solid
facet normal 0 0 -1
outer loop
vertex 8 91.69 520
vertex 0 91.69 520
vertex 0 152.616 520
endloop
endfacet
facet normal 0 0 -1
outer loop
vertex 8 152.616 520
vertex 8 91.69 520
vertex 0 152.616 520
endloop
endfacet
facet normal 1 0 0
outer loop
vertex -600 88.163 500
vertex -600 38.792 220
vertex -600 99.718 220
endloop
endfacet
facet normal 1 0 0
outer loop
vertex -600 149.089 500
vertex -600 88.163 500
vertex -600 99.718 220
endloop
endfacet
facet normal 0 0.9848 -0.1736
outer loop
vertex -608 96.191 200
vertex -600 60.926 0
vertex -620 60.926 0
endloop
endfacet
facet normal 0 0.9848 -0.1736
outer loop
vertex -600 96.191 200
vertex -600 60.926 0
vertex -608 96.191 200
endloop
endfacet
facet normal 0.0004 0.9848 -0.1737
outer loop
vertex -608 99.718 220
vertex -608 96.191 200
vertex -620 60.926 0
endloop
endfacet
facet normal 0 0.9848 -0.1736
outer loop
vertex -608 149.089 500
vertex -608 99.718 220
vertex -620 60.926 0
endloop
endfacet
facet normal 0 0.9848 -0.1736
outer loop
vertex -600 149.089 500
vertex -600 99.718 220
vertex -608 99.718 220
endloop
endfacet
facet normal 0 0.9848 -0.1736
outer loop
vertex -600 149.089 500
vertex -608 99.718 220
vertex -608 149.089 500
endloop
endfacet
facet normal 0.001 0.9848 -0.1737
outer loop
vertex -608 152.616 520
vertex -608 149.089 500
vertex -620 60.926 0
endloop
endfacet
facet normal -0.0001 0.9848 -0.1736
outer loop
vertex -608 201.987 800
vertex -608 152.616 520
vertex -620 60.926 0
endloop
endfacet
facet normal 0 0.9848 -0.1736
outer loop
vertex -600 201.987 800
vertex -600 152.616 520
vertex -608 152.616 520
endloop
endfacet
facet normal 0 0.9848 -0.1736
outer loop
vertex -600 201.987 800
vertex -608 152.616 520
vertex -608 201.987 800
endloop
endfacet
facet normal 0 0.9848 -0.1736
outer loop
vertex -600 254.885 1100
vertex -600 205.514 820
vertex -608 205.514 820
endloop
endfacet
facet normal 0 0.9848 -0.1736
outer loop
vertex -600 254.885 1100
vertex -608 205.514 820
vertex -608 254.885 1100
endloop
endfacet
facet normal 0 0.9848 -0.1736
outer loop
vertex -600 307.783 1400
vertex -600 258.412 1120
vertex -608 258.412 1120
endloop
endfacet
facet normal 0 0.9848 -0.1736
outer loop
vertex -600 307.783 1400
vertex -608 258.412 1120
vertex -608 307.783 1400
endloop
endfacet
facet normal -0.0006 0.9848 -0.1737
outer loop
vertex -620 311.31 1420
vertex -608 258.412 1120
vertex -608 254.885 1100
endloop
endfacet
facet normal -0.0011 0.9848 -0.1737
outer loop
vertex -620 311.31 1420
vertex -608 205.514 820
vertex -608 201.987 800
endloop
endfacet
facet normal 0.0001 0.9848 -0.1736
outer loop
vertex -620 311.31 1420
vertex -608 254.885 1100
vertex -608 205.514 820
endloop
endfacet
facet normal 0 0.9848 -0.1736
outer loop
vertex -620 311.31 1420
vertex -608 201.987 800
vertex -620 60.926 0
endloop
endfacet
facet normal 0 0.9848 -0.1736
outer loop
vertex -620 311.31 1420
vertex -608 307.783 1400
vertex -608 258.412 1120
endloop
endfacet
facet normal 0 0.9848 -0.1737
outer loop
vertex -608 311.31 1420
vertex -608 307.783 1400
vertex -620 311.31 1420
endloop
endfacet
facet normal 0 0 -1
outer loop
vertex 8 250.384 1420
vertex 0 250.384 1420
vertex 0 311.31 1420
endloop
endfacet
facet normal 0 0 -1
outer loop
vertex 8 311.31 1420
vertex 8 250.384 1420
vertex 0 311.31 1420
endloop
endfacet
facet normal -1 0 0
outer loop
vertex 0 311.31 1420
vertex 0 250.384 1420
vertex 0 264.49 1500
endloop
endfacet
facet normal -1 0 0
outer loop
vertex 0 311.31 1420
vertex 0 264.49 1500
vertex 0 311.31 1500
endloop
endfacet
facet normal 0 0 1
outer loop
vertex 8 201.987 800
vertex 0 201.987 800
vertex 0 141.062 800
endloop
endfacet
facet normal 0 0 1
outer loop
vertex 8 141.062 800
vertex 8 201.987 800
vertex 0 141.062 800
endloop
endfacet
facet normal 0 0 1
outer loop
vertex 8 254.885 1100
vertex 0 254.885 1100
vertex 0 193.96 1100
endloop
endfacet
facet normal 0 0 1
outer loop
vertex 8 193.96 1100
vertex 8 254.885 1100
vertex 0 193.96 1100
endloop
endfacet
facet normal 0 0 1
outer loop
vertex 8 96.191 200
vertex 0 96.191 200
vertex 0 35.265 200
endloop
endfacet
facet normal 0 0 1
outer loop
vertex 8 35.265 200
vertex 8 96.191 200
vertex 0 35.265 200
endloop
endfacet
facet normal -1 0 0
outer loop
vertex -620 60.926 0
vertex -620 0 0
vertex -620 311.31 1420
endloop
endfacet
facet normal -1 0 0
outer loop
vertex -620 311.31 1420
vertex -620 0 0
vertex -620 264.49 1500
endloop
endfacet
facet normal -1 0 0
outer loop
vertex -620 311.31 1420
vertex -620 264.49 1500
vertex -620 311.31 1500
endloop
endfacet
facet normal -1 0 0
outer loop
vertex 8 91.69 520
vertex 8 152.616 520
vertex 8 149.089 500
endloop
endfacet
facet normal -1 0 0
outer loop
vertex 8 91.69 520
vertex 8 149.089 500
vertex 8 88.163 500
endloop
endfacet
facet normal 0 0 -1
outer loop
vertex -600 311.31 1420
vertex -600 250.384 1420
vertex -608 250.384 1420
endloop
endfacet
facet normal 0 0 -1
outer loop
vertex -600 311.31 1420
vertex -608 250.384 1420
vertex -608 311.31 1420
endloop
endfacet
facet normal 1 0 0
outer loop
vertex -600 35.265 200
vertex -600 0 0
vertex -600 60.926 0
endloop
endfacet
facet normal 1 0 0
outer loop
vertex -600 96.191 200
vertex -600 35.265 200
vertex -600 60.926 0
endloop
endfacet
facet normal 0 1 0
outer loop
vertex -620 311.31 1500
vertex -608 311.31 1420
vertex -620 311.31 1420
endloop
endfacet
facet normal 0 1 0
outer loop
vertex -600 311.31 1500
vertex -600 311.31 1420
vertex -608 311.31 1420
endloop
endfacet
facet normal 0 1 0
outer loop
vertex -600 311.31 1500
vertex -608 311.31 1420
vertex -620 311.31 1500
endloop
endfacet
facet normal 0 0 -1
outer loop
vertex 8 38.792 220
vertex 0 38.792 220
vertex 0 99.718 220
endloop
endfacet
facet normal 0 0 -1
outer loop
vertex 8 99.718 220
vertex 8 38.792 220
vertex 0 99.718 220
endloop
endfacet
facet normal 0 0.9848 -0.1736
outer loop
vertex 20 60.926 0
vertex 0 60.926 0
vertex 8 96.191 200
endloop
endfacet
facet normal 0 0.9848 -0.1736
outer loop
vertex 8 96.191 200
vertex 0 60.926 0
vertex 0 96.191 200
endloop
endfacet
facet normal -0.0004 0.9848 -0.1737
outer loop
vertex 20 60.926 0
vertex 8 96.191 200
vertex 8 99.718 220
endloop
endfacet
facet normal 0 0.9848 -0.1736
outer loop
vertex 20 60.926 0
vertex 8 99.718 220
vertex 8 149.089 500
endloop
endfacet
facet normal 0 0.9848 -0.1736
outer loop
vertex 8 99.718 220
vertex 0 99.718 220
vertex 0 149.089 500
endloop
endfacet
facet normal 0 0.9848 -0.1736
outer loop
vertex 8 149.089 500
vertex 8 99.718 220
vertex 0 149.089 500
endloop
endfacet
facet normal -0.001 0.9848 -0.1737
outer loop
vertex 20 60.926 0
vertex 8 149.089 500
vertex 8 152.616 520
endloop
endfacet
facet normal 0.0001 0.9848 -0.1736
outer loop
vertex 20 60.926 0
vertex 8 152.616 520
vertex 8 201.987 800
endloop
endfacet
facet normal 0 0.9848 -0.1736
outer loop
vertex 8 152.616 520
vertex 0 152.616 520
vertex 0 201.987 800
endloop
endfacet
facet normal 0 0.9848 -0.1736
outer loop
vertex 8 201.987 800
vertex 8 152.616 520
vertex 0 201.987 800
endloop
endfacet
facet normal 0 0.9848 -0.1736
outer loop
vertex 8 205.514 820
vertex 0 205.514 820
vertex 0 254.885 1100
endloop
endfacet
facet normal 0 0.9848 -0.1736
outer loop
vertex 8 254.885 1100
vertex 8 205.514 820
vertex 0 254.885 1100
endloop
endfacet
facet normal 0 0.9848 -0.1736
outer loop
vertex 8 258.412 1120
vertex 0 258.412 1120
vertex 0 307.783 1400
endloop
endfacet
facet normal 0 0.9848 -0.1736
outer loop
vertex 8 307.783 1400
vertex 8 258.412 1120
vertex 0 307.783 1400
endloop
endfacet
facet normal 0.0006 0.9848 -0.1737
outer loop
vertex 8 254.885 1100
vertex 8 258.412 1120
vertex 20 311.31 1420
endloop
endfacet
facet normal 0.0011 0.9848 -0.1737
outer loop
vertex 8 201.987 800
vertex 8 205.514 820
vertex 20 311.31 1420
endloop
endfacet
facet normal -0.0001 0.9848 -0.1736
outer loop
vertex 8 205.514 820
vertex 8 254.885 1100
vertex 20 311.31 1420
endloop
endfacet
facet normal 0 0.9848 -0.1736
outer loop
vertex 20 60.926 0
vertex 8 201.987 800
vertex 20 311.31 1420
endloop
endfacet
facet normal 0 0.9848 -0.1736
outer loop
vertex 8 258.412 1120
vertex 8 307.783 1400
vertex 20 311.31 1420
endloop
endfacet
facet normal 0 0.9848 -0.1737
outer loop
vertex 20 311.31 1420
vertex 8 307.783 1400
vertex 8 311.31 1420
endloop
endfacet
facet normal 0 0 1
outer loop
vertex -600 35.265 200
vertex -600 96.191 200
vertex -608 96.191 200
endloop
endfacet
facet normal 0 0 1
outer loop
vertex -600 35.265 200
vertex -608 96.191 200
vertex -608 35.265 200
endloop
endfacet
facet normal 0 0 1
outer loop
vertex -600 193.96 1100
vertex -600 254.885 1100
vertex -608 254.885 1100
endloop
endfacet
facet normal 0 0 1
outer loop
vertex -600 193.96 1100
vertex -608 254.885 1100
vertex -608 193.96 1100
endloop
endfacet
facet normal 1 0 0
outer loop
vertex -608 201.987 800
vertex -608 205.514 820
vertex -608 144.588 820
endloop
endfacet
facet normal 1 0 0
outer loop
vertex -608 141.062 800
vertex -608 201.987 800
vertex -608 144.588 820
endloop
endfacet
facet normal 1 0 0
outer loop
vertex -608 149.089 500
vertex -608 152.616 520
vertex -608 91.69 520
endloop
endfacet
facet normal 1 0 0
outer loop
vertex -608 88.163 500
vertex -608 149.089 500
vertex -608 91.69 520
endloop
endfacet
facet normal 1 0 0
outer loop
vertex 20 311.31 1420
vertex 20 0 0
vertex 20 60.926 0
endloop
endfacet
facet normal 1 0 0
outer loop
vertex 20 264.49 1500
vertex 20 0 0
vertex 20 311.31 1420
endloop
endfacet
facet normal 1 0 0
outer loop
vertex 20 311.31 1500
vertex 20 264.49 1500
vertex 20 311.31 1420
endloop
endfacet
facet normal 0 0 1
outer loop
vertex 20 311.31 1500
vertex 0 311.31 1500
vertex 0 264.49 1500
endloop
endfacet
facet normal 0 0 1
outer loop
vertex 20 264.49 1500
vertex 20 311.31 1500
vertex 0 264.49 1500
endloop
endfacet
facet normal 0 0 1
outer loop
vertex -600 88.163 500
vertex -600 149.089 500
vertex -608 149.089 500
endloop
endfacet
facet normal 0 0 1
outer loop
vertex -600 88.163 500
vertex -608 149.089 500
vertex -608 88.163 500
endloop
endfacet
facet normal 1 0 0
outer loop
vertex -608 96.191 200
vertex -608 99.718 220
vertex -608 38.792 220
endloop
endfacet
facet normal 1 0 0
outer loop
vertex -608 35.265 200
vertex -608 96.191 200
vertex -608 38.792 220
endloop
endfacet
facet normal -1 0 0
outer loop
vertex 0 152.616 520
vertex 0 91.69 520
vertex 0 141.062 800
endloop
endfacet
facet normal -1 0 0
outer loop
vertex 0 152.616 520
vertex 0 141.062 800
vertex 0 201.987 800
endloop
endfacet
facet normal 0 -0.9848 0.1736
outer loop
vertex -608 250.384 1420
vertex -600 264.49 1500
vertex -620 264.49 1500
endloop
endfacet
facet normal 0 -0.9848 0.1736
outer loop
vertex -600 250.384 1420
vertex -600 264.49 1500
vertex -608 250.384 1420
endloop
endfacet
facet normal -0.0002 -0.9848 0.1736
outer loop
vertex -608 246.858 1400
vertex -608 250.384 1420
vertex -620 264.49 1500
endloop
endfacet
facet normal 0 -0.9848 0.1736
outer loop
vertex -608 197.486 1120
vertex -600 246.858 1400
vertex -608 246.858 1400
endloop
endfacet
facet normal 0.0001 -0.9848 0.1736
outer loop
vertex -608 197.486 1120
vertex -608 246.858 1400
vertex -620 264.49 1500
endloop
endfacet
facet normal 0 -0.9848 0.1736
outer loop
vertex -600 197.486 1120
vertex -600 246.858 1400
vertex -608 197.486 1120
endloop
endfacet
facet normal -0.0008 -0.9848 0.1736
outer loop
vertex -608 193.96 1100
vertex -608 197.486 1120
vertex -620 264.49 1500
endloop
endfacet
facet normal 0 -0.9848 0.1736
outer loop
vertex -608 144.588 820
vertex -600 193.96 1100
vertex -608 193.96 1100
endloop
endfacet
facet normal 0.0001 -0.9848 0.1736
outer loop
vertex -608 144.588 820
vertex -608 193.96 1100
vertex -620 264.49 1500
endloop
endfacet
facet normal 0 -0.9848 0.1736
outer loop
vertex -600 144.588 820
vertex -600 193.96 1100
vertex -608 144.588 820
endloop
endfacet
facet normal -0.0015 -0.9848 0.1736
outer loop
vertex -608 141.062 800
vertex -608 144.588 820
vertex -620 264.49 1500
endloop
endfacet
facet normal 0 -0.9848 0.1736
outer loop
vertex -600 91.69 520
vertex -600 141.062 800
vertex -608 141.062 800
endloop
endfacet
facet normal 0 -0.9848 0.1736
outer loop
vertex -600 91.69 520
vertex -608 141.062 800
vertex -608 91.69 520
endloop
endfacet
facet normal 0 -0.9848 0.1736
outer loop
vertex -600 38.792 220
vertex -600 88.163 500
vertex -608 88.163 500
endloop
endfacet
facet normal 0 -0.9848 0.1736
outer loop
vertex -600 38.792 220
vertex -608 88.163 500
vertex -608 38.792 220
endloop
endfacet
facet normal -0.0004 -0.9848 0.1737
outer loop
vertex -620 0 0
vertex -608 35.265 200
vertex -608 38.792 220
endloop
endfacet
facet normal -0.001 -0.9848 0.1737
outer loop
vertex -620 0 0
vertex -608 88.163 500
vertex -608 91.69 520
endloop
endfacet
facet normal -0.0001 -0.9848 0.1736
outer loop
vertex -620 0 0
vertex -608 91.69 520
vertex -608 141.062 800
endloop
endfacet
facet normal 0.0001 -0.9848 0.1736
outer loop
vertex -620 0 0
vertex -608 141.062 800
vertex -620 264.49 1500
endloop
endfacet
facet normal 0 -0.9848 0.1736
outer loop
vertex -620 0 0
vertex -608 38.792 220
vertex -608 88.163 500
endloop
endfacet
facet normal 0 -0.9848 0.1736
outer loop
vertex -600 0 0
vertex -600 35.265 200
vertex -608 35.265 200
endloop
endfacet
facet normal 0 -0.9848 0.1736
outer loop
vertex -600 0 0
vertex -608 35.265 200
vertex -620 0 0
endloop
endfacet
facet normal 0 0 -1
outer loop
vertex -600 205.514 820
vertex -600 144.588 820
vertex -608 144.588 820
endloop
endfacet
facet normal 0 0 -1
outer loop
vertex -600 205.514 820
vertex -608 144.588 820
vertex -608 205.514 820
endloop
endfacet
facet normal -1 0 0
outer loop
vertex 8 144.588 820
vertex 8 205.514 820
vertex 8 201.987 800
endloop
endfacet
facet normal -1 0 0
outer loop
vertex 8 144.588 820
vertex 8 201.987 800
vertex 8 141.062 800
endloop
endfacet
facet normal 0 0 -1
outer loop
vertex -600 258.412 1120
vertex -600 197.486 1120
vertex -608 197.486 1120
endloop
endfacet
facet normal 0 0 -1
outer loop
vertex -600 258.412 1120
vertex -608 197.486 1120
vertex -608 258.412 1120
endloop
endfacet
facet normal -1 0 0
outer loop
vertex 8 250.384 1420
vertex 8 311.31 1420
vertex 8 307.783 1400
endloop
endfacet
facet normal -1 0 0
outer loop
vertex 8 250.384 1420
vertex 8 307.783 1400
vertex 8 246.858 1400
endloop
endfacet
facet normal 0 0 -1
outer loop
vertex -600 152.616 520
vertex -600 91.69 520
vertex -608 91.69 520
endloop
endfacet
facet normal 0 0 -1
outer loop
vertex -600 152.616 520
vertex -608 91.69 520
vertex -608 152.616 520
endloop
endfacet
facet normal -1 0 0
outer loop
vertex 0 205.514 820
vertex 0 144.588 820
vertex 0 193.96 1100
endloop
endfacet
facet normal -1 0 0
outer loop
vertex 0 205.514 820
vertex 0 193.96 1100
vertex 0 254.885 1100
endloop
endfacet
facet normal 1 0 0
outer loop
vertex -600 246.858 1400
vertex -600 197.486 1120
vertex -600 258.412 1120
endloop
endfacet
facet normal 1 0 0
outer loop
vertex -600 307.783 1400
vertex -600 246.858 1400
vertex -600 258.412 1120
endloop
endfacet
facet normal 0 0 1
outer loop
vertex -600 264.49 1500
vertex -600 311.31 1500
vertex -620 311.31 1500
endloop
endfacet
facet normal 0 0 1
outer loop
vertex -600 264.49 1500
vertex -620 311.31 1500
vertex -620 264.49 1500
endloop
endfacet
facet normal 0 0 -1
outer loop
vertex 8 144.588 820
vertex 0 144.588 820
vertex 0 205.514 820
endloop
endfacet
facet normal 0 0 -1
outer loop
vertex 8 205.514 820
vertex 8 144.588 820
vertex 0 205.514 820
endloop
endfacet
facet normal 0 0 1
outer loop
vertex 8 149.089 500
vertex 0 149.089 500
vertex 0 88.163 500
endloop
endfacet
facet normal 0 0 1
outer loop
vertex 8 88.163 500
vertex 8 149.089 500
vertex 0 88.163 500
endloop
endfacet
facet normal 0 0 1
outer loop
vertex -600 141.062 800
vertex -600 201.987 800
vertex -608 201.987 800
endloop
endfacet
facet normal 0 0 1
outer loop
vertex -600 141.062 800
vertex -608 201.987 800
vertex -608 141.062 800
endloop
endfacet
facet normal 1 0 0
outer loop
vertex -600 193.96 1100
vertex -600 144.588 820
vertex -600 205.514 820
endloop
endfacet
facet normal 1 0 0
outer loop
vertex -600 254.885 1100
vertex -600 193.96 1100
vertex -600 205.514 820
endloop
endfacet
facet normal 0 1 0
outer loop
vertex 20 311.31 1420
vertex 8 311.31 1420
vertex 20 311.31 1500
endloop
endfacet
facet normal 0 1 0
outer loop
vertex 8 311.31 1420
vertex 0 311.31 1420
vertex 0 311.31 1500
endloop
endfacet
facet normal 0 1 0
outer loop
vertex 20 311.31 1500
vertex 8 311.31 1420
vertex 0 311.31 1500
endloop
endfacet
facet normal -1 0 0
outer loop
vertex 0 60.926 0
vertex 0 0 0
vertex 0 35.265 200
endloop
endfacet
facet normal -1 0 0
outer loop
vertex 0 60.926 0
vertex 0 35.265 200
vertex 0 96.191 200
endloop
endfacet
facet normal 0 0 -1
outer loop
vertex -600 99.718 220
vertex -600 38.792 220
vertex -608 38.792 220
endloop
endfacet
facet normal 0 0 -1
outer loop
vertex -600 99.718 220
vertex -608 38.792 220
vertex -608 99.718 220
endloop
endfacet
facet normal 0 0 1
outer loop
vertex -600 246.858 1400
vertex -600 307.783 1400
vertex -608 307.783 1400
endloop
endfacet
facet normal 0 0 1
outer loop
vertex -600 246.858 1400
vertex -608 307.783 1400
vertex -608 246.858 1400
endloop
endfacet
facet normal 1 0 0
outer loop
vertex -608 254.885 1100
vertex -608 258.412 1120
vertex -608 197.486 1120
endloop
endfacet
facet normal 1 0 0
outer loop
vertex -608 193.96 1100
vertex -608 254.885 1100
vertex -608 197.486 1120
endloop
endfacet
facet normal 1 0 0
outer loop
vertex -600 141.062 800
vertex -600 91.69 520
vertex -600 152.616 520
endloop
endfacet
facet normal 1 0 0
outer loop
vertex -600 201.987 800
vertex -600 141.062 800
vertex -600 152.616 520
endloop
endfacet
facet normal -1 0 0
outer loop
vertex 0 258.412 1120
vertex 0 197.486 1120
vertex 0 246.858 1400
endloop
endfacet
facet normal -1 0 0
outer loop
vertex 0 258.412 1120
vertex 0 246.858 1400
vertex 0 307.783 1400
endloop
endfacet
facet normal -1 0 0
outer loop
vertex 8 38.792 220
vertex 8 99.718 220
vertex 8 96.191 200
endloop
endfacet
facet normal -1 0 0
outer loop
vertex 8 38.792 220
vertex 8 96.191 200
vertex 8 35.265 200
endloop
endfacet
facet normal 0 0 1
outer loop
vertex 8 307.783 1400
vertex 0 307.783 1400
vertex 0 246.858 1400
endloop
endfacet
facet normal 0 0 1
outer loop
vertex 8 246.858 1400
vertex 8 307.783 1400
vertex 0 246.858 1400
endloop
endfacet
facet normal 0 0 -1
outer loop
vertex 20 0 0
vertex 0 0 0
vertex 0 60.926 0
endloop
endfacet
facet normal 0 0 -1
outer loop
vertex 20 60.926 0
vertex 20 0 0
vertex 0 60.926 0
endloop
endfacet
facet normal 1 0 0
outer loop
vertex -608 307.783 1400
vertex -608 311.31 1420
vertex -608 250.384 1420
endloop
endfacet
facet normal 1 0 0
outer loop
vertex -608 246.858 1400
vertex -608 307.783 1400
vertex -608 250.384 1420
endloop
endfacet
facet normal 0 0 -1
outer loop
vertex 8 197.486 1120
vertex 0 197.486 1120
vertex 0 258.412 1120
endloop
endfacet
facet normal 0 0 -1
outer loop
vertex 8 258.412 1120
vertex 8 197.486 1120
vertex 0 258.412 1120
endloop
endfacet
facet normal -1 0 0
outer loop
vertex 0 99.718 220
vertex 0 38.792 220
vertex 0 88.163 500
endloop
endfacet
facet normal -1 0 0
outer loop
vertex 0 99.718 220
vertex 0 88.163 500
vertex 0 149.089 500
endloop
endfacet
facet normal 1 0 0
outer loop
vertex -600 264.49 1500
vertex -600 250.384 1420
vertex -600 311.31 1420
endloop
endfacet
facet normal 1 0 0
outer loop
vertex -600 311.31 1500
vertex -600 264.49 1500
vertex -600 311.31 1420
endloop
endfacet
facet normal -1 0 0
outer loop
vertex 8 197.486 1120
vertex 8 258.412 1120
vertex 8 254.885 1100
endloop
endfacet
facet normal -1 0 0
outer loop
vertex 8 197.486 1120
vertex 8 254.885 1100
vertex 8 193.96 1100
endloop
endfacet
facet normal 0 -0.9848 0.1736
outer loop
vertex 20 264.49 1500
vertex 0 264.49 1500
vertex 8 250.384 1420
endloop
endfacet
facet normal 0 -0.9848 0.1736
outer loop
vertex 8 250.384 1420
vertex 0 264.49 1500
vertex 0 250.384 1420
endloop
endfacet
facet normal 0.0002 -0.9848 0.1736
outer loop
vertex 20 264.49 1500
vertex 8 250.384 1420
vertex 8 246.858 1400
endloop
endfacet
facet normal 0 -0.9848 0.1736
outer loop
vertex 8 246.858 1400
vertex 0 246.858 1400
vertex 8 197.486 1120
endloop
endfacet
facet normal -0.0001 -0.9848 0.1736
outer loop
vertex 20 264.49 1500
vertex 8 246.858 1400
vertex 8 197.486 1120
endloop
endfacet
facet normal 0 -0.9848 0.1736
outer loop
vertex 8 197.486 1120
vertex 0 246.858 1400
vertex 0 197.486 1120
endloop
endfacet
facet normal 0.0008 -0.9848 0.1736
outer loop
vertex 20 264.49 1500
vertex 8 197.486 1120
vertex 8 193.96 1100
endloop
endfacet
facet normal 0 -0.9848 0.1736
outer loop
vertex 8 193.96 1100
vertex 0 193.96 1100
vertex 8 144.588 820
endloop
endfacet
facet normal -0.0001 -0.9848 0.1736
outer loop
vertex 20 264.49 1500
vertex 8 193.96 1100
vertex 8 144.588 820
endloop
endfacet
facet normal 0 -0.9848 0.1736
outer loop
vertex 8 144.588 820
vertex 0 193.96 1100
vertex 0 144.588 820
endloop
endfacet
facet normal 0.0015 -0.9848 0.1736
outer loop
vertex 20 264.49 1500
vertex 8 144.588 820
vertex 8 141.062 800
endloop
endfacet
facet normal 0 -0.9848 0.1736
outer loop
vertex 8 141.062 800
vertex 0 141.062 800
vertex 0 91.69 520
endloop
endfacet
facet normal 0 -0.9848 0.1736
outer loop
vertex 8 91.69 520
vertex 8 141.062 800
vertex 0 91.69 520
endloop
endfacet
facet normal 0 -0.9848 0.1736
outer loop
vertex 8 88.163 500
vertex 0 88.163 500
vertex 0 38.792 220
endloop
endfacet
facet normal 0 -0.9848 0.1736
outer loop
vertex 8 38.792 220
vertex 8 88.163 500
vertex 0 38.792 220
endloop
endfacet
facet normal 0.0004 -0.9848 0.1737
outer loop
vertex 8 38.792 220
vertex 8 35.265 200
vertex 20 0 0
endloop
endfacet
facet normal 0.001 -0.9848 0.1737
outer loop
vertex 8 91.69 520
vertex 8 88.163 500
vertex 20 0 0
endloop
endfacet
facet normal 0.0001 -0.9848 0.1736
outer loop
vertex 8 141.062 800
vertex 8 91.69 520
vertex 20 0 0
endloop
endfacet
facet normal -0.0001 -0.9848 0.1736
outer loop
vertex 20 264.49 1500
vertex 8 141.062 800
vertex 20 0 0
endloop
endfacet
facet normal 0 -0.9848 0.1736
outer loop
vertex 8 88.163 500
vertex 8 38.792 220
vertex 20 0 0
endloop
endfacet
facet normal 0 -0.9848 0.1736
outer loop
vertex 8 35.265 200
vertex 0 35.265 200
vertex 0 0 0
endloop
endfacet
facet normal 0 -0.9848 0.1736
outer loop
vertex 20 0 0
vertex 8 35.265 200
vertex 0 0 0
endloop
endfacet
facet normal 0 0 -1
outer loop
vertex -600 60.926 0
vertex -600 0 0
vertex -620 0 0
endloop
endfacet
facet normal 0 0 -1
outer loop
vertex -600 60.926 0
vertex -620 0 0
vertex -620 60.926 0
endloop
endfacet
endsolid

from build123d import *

# Parameters (mm, degrees)
F1_DEPTH = 20
F3_DEPTH = 8
F5_DEPTH = 20.001


with BuildPart() as f1:
    # F0 (on Right) → F1 (new body)
    with BuildSketch(Plane.YZ):
        Polygon((264.4904710627, 1500), (0, 0), (60.9255967131, 0), (325.4160677758, 1500), align=None)
    extrude(amount=F1_DEPTH)

    # F2 (on face) → F3 (cut)
    with BuildSketch(Plane(origin=(0, 0, 0), x_dir=(0, -1, 0), z_dir=(-1, 0, 0))):
        Polygon((-246.8577729919, 1400), (-250.384312606, 1420), (-311.3099093192, 1420), (-307.783369705, 1400), align=None)
        Polygon((-99.717532469, 220), (-96.1909928548, 200), (-35.2653961417, 200), (-38.7919357559, 220), align=None)
        Polygon((-152.6156266815, 520), (-149.0890870674, 500), (-88.1634903542, 500), (-91.6900299684, 520), align=None)
        Polygon((-205.5137208941, 820), (-201.9871812799, 800), (-141.0615845668, 800), (-144.5881241809, 820), align=None)
        Polygon((-258.4118151066, 1120), (-254.8852754925, 1100), (-193.9596787793, 1100), (-197.4862183935, 1120), align=None)
    extrude(amount=-F3_DEPTH, mode=Mode.SUBTRACT)

    # F4 (on face) → F5 (cut, through all)
    with BuildSketch(Plane(origin=(0, 0, 0), x_dir=(0, -1, 0), z_dir=(-1, 0, 0))):
        Polygon((-325.4160677758, 1500), (-311.3099093192, 1420), (-311.3099093192, 1500), align=None)
    extrude(amount=-F5_DEPTH, mode=Mode.SUBTRACT)


with BuildPart() as f7_1:
    # F7: instance of F1
    add(f1.part.mirror(Plane.YZ.offset(-300)))


solid = Compound([f1.part, f7_1.part])
